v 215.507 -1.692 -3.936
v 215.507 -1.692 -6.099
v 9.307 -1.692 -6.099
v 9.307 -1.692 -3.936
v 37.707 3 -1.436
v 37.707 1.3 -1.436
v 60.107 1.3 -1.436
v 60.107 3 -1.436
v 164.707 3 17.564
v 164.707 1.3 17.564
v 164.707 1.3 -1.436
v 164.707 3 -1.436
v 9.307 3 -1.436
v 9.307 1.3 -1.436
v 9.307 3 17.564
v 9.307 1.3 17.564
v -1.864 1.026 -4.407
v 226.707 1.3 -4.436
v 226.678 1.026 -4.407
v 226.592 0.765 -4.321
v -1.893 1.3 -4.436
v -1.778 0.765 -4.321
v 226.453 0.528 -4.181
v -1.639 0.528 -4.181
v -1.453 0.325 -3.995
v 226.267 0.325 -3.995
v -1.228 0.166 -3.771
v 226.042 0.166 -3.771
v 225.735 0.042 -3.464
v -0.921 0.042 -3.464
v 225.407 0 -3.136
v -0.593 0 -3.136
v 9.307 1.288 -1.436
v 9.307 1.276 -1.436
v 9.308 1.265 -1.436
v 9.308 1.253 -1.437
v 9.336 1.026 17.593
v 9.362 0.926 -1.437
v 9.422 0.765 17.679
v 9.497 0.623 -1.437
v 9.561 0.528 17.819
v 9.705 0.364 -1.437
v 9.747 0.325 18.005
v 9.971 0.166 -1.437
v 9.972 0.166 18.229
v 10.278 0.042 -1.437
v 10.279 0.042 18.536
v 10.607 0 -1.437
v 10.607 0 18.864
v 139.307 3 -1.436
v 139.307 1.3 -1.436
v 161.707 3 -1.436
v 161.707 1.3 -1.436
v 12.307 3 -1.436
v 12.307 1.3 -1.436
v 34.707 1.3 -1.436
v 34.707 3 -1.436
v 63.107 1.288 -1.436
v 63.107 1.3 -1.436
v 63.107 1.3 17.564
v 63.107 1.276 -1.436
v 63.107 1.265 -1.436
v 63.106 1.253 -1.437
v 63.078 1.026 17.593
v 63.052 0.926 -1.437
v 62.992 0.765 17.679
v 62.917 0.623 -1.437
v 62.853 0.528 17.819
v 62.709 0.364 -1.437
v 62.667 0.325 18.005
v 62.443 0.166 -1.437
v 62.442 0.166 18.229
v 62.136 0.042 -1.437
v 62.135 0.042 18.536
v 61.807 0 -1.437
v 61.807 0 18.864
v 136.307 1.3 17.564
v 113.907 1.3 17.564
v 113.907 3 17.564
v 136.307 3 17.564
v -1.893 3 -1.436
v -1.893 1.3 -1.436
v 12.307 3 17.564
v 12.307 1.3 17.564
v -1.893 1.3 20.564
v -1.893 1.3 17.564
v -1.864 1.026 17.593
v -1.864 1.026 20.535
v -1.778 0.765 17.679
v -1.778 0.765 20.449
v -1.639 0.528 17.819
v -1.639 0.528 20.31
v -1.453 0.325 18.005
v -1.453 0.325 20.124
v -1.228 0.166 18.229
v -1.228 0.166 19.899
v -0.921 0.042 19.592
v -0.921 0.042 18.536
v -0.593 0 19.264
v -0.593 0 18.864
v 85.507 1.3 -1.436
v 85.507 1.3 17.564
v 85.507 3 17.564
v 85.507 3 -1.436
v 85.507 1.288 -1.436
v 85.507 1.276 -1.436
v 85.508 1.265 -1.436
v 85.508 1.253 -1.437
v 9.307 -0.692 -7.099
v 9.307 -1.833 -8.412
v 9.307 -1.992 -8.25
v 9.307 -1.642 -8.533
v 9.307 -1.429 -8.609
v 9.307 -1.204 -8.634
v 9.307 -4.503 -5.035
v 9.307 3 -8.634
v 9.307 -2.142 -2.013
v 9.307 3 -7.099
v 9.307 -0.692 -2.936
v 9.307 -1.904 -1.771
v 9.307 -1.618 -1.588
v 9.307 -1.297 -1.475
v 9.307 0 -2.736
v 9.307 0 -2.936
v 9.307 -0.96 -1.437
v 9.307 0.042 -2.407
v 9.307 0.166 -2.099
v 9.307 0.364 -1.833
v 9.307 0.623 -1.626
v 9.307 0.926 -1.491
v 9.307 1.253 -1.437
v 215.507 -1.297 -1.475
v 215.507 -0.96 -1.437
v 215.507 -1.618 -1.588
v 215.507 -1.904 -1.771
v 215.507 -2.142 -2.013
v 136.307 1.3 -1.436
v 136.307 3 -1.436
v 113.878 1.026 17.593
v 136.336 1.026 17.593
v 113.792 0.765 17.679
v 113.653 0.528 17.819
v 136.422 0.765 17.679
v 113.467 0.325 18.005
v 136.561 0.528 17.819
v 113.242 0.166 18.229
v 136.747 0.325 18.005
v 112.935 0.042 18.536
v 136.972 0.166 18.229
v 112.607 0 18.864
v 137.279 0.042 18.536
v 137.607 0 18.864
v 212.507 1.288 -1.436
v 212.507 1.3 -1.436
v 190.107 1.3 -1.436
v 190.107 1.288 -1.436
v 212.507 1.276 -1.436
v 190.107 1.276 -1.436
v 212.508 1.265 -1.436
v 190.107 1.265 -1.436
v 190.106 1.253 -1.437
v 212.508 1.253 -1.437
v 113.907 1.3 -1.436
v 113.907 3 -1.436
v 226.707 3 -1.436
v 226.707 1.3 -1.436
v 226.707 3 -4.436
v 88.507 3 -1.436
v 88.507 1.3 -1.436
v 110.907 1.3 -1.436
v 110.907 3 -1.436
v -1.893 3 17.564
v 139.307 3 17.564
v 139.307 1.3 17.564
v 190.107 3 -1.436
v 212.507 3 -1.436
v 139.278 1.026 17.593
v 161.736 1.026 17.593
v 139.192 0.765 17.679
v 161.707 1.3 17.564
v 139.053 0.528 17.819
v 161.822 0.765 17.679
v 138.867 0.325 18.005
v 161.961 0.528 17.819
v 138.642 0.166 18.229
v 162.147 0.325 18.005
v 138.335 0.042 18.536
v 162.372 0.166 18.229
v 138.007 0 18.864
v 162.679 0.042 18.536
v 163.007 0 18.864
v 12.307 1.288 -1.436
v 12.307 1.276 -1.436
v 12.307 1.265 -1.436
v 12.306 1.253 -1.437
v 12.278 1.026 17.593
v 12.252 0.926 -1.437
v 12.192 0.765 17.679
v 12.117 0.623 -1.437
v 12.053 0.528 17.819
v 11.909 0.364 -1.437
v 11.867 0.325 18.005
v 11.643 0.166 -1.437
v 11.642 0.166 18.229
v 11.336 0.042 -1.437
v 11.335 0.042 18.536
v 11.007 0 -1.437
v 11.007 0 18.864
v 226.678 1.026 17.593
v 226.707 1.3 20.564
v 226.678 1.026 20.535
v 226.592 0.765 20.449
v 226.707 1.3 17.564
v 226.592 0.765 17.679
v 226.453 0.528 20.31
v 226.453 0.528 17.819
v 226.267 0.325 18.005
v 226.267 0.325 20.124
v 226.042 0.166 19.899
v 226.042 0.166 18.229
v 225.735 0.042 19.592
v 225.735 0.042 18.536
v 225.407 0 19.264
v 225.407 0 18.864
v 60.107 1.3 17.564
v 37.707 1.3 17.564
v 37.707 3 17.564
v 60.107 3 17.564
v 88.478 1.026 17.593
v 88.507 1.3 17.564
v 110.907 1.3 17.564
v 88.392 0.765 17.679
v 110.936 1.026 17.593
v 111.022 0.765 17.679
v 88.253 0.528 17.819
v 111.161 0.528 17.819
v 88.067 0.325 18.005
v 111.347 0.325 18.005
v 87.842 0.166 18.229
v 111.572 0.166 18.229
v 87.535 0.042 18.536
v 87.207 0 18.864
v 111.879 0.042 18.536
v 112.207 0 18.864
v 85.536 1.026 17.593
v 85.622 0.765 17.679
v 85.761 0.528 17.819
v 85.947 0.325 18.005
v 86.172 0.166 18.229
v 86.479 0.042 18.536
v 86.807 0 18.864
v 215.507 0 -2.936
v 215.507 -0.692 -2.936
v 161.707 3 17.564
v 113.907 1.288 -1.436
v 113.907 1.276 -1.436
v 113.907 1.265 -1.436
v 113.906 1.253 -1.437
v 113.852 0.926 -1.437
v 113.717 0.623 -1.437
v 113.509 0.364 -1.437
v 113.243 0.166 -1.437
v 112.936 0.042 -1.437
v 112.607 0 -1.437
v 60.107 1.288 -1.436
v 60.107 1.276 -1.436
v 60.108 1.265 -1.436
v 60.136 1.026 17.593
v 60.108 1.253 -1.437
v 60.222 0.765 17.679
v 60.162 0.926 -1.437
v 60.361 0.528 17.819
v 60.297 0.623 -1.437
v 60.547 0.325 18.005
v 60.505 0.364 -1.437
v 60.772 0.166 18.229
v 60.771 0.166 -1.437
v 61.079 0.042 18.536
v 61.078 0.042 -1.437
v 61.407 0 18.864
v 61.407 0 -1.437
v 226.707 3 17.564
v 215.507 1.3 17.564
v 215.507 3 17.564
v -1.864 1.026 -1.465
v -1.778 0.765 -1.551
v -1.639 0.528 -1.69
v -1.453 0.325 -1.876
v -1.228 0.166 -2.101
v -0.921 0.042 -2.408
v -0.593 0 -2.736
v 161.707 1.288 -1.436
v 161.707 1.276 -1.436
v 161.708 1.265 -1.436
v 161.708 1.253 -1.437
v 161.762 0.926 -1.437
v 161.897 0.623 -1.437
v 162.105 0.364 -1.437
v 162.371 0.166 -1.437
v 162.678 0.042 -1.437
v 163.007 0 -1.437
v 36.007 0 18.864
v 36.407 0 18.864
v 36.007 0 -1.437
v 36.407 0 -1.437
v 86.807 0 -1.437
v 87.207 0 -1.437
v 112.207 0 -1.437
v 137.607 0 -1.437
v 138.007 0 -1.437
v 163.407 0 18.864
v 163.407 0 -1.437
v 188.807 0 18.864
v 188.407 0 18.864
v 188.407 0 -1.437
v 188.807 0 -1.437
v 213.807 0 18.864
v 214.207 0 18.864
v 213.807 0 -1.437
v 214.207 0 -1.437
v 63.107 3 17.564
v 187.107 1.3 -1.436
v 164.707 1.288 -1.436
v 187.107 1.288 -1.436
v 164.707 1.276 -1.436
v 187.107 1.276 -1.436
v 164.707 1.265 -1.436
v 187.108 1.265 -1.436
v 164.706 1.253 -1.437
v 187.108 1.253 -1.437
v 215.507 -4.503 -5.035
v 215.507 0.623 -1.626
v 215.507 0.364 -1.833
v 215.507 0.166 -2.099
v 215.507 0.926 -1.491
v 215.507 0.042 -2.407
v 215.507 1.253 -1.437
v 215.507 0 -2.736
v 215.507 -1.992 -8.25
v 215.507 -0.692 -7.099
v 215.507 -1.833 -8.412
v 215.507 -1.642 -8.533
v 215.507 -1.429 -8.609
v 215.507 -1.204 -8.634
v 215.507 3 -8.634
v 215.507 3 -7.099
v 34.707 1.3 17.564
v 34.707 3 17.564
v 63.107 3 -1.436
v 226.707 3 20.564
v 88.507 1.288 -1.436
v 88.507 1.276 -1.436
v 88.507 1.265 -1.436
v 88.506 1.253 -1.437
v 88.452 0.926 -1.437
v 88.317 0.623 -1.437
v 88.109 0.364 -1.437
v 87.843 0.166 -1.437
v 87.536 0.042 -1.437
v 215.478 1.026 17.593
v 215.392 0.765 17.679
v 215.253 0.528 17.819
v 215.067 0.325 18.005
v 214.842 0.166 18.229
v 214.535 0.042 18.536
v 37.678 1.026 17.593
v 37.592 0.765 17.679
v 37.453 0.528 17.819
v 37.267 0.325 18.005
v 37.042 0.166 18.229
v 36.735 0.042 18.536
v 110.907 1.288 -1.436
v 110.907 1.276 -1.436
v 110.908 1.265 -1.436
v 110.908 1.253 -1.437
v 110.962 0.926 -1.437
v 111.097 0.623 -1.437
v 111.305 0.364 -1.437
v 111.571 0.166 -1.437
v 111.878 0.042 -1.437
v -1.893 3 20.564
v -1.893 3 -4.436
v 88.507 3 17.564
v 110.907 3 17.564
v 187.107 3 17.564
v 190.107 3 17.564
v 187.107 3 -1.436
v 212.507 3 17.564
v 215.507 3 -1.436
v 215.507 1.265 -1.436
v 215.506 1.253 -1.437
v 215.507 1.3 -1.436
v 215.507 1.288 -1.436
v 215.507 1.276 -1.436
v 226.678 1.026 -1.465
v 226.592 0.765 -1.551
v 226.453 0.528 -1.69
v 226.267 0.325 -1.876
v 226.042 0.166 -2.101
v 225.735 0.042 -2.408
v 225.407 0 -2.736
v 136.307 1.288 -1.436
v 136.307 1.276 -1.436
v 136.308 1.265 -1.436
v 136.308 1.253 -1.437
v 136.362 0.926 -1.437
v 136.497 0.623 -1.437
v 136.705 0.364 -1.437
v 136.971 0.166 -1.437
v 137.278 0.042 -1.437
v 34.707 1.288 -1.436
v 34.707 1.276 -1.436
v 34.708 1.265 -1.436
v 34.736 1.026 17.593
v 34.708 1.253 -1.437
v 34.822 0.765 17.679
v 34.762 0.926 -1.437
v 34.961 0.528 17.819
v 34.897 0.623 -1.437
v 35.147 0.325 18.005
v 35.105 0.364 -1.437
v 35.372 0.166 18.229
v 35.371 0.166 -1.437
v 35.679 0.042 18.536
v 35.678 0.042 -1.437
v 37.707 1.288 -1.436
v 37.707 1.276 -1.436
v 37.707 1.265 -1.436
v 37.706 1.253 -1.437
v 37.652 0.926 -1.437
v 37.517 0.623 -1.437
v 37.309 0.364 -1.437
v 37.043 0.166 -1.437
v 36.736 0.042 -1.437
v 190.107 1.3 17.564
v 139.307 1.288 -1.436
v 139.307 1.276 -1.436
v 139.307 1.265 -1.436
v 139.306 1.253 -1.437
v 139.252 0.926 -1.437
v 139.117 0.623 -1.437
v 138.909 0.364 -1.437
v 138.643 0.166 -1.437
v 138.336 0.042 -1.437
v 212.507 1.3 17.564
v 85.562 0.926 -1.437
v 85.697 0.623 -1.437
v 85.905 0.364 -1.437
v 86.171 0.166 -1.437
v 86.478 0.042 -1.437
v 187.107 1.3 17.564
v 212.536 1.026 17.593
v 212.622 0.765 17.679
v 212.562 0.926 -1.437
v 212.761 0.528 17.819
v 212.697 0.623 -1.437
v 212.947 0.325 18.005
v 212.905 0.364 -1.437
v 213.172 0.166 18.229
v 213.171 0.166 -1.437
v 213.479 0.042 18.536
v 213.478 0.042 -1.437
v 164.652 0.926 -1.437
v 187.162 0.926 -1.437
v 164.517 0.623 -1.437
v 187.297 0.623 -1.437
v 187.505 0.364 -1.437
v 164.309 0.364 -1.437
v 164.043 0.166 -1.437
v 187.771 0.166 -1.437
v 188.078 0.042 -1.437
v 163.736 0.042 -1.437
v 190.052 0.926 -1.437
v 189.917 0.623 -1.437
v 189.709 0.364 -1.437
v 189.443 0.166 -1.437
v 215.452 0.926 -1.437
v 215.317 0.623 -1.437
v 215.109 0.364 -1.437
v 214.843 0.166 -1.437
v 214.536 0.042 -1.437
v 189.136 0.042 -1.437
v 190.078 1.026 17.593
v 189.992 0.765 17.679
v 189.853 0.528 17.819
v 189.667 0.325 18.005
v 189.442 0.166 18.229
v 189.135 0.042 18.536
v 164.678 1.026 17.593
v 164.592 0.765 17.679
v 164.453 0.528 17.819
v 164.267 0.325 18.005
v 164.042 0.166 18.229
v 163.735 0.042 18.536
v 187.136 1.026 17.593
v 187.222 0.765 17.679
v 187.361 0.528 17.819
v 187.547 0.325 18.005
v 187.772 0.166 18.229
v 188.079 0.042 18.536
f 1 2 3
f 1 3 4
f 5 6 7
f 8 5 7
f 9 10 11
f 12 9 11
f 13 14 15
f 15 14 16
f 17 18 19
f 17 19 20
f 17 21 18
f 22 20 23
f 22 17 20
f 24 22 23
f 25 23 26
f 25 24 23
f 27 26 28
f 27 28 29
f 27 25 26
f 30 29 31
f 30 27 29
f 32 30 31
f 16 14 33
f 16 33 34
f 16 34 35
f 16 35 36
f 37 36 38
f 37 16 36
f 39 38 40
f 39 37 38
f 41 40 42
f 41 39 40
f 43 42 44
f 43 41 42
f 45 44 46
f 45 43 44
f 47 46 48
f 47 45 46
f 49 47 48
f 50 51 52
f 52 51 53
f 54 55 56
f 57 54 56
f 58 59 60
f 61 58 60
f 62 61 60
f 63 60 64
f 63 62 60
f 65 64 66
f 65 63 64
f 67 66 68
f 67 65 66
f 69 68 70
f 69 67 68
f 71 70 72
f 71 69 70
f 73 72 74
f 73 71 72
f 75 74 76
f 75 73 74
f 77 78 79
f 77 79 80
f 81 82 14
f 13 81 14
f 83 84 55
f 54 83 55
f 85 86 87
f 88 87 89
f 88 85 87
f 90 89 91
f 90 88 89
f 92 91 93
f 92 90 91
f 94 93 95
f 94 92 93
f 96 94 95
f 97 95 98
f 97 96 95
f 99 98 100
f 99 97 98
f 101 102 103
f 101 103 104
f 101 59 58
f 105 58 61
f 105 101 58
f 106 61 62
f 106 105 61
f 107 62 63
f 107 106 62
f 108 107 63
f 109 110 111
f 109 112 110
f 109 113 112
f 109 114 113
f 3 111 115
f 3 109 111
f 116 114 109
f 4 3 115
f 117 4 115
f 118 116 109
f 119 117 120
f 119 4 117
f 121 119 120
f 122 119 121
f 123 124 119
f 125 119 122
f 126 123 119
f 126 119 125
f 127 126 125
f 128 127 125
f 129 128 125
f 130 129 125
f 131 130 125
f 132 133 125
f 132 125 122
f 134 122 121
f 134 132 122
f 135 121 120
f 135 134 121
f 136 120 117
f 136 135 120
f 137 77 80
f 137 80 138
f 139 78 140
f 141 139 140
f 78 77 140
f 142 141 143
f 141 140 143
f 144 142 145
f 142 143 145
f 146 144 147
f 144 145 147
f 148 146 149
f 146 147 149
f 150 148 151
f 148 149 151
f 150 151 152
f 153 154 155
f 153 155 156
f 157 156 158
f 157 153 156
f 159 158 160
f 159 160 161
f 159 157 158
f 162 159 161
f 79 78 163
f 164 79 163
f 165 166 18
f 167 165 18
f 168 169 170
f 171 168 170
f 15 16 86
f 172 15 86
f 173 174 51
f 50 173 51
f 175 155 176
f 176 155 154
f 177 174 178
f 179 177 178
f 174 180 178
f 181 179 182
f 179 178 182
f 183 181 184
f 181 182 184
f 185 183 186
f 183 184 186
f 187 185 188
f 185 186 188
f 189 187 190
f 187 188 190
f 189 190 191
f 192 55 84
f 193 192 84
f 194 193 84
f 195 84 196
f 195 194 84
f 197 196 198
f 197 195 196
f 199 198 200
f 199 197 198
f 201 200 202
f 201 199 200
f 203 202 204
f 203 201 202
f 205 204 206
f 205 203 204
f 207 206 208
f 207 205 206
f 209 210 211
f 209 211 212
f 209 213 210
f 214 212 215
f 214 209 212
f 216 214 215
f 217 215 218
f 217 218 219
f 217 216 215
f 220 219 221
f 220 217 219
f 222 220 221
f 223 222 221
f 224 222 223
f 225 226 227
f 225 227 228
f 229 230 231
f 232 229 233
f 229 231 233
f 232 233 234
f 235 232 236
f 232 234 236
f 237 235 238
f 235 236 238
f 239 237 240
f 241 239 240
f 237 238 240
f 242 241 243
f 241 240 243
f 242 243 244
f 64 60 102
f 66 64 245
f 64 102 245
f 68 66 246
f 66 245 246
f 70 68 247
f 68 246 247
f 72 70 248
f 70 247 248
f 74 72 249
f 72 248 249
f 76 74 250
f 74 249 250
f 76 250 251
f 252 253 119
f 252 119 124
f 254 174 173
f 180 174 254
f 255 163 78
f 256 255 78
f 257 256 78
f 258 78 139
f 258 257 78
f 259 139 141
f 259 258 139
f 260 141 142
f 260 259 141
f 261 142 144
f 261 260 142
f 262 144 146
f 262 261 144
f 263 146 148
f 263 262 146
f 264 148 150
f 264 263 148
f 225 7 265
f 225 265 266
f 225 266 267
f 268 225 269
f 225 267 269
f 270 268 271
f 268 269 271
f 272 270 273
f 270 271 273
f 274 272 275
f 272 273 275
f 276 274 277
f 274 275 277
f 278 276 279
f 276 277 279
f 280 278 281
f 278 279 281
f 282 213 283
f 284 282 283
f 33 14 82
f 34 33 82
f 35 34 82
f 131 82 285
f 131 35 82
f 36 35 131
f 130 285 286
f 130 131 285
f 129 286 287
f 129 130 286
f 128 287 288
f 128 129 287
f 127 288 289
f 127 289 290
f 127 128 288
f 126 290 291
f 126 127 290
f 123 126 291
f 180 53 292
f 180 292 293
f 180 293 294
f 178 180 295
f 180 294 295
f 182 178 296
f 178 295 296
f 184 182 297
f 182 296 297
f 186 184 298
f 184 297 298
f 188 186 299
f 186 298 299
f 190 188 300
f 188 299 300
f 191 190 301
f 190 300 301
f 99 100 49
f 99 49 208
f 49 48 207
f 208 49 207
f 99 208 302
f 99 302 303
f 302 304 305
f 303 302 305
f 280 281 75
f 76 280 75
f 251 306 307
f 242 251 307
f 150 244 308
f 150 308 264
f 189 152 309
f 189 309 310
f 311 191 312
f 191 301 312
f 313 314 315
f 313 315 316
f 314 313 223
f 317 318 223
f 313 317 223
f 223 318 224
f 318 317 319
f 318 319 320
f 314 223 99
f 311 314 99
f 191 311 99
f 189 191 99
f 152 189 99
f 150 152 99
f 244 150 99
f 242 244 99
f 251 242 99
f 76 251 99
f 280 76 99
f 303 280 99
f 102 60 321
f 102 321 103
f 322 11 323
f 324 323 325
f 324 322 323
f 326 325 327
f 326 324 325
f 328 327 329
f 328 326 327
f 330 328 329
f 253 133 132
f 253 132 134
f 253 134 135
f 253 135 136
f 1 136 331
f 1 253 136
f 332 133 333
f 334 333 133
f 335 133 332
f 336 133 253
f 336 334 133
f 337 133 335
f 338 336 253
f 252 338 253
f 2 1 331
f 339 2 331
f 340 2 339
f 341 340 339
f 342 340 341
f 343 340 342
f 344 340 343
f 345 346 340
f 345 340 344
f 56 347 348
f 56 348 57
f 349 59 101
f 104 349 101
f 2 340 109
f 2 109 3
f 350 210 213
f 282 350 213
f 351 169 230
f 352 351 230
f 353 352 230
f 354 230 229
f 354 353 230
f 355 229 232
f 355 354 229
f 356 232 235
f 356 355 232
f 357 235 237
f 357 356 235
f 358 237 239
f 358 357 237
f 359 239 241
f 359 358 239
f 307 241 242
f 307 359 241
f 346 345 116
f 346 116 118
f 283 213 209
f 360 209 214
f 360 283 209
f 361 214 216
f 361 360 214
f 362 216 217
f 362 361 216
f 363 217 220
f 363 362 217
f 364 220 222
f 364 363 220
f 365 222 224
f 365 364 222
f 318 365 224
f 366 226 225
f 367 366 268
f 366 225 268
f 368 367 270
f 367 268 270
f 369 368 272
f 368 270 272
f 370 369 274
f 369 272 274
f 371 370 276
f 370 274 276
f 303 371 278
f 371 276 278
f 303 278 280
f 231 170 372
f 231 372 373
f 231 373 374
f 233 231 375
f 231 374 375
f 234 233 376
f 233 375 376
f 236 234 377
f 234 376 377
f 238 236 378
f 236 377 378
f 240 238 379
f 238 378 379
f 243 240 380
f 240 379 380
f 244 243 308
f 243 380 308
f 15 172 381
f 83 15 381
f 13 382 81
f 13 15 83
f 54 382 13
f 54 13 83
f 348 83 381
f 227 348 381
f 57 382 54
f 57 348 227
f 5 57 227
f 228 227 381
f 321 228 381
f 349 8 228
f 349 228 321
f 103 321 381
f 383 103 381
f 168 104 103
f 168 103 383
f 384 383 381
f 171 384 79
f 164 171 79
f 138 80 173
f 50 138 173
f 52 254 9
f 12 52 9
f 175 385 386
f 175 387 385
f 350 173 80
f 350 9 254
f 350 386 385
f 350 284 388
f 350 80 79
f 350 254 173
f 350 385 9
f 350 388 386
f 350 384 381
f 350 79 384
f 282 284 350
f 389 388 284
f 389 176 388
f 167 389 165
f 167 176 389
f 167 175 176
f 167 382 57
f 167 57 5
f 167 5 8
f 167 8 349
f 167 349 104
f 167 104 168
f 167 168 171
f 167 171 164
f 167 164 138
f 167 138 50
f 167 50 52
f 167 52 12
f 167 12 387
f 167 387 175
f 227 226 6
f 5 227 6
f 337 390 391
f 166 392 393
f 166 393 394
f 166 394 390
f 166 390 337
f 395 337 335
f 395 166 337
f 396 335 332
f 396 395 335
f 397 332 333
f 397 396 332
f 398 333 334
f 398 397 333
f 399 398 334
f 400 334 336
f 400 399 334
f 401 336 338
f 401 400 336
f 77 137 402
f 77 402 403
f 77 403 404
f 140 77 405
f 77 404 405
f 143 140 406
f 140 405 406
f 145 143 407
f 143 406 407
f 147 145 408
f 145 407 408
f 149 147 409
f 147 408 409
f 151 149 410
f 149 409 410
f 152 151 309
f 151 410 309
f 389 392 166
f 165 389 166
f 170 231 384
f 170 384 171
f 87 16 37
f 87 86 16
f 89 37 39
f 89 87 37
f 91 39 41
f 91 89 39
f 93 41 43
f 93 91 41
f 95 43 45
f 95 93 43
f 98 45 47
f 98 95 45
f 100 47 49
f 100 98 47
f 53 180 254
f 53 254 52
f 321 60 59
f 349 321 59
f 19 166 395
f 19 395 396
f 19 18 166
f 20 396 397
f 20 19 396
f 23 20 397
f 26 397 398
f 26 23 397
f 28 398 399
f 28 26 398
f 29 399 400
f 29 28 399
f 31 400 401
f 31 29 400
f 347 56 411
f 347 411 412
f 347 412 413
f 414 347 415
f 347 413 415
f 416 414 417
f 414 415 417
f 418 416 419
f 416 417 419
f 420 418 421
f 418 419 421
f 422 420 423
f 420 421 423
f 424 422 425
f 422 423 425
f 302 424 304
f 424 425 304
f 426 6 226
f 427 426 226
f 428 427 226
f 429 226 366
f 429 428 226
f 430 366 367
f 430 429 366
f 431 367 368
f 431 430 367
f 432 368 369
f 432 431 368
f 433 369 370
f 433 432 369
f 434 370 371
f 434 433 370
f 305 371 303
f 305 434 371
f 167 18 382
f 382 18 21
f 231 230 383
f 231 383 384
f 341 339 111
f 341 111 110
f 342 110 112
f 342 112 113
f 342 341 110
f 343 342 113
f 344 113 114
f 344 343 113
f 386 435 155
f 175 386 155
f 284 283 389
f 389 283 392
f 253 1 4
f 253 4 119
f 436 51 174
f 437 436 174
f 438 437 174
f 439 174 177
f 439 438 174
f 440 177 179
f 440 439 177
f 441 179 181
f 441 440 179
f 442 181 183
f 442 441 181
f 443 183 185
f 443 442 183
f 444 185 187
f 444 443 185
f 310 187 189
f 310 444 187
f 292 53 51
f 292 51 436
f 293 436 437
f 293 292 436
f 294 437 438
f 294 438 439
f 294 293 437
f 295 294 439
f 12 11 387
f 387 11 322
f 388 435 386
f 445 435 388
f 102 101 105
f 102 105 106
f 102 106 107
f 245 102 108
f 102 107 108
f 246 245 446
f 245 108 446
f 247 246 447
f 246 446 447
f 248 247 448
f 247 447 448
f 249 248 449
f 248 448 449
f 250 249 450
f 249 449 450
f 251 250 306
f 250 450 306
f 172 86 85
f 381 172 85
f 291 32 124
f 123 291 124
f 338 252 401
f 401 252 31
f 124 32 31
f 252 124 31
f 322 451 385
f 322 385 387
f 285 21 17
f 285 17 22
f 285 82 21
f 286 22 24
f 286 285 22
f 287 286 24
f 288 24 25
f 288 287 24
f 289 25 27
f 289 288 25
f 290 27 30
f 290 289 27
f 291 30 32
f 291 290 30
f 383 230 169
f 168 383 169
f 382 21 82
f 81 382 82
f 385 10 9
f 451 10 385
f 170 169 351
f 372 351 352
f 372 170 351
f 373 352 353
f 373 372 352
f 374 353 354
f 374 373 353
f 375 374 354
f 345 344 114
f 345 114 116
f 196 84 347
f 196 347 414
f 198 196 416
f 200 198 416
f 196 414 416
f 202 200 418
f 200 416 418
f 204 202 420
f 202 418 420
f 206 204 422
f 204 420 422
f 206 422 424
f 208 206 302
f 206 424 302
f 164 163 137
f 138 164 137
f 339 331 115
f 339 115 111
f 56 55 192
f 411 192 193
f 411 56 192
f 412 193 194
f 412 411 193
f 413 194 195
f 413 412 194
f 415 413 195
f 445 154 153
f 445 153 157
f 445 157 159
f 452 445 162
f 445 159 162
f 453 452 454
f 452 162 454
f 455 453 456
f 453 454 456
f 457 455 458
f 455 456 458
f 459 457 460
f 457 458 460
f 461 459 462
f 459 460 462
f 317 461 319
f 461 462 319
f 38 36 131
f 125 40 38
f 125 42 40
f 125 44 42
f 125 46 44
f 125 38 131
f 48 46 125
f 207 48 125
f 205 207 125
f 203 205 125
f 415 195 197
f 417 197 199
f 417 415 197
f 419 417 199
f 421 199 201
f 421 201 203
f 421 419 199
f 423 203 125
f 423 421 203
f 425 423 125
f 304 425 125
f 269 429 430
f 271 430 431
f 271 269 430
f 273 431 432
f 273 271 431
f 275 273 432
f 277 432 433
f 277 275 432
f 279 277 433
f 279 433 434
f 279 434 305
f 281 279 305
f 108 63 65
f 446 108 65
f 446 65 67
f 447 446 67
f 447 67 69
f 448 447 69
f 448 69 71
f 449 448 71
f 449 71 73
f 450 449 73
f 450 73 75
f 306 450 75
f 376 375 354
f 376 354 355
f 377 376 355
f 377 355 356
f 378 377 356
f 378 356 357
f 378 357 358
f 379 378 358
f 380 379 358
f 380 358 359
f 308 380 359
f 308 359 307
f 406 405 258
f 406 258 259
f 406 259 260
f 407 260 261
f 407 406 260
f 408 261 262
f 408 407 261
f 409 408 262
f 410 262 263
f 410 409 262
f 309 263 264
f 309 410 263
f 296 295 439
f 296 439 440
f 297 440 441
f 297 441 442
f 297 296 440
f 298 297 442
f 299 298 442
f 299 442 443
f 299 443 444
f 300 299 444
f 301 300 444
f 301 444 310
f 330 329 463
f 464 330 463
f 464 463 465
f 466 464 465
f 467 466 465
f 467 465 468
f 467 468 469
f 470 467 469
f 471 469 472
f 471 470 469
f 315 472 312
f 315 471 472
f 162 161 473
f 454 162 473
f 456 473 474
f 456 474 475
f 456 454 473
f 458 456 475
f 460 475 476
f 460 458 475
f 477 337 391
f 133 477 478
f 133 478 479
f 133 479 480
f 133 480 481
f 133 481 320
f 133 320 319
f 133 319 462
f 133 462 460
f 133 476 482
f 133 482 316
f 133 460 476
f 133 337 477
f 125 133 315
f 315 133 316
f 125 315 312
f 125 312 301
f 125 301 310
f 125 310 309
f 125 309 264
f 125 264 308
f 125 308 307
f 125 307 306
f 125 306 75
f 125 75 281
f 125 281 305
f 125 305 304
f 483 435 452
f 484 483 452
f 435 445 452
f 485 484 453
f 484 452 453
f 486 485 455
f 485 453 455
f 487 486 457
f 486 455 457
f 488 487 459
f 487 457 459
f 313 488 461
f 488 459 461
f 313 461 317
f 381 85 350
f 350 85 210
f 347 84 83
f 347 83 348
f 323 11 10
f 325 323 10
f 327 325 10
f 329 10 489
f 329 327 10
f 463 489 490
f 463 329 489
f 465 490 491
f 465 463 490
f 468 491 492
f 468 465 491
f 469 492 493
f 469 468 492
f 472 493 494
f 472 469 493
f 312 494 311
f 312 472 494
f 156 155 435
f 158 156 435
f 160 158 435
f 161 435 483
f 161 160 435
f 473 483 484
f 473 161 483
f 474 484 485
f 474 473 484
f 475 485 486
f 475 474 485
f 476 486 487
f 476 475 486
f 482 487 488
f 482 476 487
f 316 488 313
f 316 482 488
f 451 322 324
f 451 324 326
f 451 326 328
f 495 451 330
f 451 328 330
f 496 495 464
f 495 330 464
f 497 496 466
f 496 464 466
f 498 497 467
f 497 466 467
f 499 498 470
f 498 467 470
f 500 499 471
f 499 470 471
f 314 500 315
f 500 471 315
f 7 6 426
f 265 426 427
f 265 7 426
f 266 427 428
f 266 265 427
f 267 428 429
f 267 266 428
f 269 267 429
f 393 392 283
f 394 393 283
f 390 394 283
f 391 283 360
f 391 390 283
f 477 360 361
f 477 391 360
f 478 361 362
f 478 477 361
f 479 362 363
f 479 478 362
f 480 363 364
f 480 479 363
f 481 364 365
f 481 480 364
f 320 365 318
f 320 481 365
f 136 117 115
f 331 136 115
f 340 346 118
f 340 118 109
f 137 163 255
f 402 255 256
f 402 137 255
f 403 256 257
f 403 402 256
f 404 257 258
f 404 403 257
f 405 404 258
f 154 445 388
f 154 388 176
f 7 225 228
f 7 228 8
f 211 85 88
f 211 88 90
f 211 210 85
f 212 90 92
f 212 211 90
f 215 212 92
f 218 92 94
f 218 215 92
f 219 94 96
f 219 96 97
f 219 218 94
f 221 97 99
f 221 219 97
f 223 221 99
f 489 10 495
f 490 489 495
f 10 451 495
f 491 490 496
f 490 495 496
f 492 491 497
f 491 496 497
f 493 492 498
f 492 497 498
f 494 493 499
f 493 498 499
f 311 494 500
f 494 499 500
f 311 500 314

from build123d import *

# Parameters (mm, degrees)
SKETCH1_W           = 22.4
SKETCH1_H           = 19
BOSS_EXTRUDE1_DEPTH = 3
FILLET2_R           = 1.3
BOSS_EXTRUDE2_REACH = 220.391


with BuildPart() as part:
    # Sketch1 → Boss-Extrude1 (new body)
    with BuildSketch(Plane(origin=(0, 0, 0), x_dir=(1, 0, 0), z_dir=(0, 1, 0))):
        Polygon((-1.892946275, -20.564259839), (226.707053725, -20.564259839), (226.707053725, -17.564259839), (215.507053725, -17.564259839), (215.507053725, 1.435740161), (226.707053725, 1.435740161), (226.707053725, 4.435740161), (-1.892946275, 4.435740161), (-1.892946275, 1.435740161), (9.307053725, 1.435740161), (9.307053725, -17.564259839), (-1.892946275, -17.564259839), align=None)
        with Locations((23.507053725, -8.064259839)):
            Rectangle(SKETCH1_W, SKETCH1_H, mode=Mode.SUBTRACT)
        with Locations((201.307053725, -8.064259839)):
            Rectangle(SKETCH1_W, SKETCH1_H, mode=Mode.SUBTRACT)
        with Locations((175.907053725, -8.064259839)):
            Rectangle(SKETCH1_W, SKETCH1_H, mode=Mode.SUBTRACT)
        with Locations((150.507053725, -8.064259839)):
            Rectangle(SKETCH1_W, SKETCH1_H, mode=Mode.SUBTRACT)
        with Locations((125.107053725, -8.064259839)):
            Rectangle(SKETCH1_W, SKETCH1_H, mode=Mode.SUBTRACT)
        with Locations((99.707053725, -8.064259839)):
            Rectangle(SKETCH1_W, SKETCH1_H, mode=Mode.SUBTRACT)
        with Locations((74.307053725, -8.064259839)):
            Rectangle(SKETCH1_W, SKETCH1_H, mode=Mode.SUBTRACT)
        with Locations((48.907053725, -8.064259839)):
            Rectangle(SKETCH1_W, SKETCH1_H, mode=Mode.SUBTRACT)
    extrude(amount=BOSS_EXTRUDE1_DEPTH)

    # Fillet2
    fillet2_edges = [part.edges().sort_by_distance(p)[0] for p in [
        (113.907053725, 0, 8.064259839),
        (125.107053725, 0, 17.564259839),
        (110.907053725, 0, 8.064259839),
        (125.107053725, 0, -1.435740161),
        (139.307053725, 0, 8.064259839),
        (150.507053725, 0, 17.564259839),
        (3.707053725, 0, -1.435740161),
        (136.307053725, 0, 8.064259839),
        (150.507053725, 0, -1.435740161),
        (9.307053725, 0, 8.064259839),
        (161.707053725, 0, 8.064259839),
        (3.707053725, 0, 17.564259839),
        (175.907053725, 0, -1.435740161),
        (164.707053725, 0, 8.064259839),
        (175.907053725, 0, 17.564259839),
        (-1.892946275, 0, 19.064259839),
        (187.107053725, 0, 8.064259839),
        (112.407053725, 0, 20.564259839),
        (201.307053725, 0, -1.435740161),
        (190.107053725, 0, 8.064259839),
        (201.307053725, 0, 17.564259839),
        (212.507053725, 0, 8.064259839),
        (226.707053725, 0, -2.935740161),
        (221.107053725, 0, -1.435740161),
        (215.507053725, 0, 8.064259839),
        (221.107053725, 0, 17.564259839),
        (23.507053725, 0, 17.564259839),
        (226.707053725, 0, 19.064259839),
        (12.307053725, 0, 8.064259839),
        (23.507053725, 0, -1.435740161),
        (112.407053725, 0, -4.435740161),
        (-1.892946275, 0, -2.935740161),
        (34.707053725, 0, 8.064259839),
        (48.907053725, 0, -1.435740161),
        (37.707053725, 0, 8.064259839),
        (48.907053725, 0, 17.564259839),
        (60.107053725, 0, 8.064259839),
        (74.307053725, 0, -1.435740161),
        (63.107053725, 0, 8.064259839),
        (74.307053725, 0, 17.564259839),
        (85.507053725, 0, 8.064259839),
        (99.707053725, 0, -1.435740161),
        (88.507053725, 0, 8.064259839),
        (99.707053725, 0, 17.564259839),
    ]]
    fillet(fillet2_edges, radius=FILLET2_R)

    # Boss-Extrude2: up to this face of the body (flat: up to its plane)
    boss_extrude2_end = Plane(part.part.faces().sort_by_distance((9.307053725, 2.15, 8.064259839))[0])
    # Sketch2 → Boss-Extrude2 (add, up to the picked face)
    with BuildSketch(Plane(origin=(215.507053725, 0, 0), x_dir=(0, 0, -1), z_dir=(1, 0, 0)), mode=Mode.PRIVATE) as boss_extrude2_sk1:
        with BuildLine():
            Line((2.935740161, 1.3), (1.43659757, 1.3))
            Line((1.43659757, 1.3), (1.43659757, -0.960067332))
            ThreePointArc((1.43659757, -0.960067332), (1.588401468, -1.617613734), (2.013087264, -2.142069327))
            Line((2.013087264, -2.142069327), (5.035485323, -4.503499992))
            Line((5.035485323, -4.503499992), (8.250046613, -1.991930219))
            ThreePointArc((8.250046613, -1.991930219), (8.533170477, -1.642293157), (8.634373075, -1.203928889))
            Line((8.634373075, -1.203928889), (8.634373075, 3))
            Line((8.634373075, 3), (7.098760361, 3))
            Line((7.098760361, 3), (7.098760361, -0.691652004))
            Line((7.098760361, -0.691652004), (6.098760361, -1.691652004))
            Line((6.098760361, -1.691652004), (3.935740161, -1.691652004))
            Line((3.935740161, -1.691652004), (2.935740161, -0.691652004))
            Line((2.935740161, -0.691652004), (2.935740161, 1.3))
        make_face()
    boss_extrude2_tool1 = split(extrude(boss_extrude2_sk1.sketch, amount=-BOSS_EXTRUDE2_REACH, mode=Mode.PRIVATE), bisect_by=boss_extrude2_end, keep=Keep.BOTH, mode=Mode.PRIVATE)
    add(boss_extrude2_tool1.solids().sort_by(Axis((215.507054, 1.196024, -2.186169), (-1, 0, 0)))[0])


solid = part.part
